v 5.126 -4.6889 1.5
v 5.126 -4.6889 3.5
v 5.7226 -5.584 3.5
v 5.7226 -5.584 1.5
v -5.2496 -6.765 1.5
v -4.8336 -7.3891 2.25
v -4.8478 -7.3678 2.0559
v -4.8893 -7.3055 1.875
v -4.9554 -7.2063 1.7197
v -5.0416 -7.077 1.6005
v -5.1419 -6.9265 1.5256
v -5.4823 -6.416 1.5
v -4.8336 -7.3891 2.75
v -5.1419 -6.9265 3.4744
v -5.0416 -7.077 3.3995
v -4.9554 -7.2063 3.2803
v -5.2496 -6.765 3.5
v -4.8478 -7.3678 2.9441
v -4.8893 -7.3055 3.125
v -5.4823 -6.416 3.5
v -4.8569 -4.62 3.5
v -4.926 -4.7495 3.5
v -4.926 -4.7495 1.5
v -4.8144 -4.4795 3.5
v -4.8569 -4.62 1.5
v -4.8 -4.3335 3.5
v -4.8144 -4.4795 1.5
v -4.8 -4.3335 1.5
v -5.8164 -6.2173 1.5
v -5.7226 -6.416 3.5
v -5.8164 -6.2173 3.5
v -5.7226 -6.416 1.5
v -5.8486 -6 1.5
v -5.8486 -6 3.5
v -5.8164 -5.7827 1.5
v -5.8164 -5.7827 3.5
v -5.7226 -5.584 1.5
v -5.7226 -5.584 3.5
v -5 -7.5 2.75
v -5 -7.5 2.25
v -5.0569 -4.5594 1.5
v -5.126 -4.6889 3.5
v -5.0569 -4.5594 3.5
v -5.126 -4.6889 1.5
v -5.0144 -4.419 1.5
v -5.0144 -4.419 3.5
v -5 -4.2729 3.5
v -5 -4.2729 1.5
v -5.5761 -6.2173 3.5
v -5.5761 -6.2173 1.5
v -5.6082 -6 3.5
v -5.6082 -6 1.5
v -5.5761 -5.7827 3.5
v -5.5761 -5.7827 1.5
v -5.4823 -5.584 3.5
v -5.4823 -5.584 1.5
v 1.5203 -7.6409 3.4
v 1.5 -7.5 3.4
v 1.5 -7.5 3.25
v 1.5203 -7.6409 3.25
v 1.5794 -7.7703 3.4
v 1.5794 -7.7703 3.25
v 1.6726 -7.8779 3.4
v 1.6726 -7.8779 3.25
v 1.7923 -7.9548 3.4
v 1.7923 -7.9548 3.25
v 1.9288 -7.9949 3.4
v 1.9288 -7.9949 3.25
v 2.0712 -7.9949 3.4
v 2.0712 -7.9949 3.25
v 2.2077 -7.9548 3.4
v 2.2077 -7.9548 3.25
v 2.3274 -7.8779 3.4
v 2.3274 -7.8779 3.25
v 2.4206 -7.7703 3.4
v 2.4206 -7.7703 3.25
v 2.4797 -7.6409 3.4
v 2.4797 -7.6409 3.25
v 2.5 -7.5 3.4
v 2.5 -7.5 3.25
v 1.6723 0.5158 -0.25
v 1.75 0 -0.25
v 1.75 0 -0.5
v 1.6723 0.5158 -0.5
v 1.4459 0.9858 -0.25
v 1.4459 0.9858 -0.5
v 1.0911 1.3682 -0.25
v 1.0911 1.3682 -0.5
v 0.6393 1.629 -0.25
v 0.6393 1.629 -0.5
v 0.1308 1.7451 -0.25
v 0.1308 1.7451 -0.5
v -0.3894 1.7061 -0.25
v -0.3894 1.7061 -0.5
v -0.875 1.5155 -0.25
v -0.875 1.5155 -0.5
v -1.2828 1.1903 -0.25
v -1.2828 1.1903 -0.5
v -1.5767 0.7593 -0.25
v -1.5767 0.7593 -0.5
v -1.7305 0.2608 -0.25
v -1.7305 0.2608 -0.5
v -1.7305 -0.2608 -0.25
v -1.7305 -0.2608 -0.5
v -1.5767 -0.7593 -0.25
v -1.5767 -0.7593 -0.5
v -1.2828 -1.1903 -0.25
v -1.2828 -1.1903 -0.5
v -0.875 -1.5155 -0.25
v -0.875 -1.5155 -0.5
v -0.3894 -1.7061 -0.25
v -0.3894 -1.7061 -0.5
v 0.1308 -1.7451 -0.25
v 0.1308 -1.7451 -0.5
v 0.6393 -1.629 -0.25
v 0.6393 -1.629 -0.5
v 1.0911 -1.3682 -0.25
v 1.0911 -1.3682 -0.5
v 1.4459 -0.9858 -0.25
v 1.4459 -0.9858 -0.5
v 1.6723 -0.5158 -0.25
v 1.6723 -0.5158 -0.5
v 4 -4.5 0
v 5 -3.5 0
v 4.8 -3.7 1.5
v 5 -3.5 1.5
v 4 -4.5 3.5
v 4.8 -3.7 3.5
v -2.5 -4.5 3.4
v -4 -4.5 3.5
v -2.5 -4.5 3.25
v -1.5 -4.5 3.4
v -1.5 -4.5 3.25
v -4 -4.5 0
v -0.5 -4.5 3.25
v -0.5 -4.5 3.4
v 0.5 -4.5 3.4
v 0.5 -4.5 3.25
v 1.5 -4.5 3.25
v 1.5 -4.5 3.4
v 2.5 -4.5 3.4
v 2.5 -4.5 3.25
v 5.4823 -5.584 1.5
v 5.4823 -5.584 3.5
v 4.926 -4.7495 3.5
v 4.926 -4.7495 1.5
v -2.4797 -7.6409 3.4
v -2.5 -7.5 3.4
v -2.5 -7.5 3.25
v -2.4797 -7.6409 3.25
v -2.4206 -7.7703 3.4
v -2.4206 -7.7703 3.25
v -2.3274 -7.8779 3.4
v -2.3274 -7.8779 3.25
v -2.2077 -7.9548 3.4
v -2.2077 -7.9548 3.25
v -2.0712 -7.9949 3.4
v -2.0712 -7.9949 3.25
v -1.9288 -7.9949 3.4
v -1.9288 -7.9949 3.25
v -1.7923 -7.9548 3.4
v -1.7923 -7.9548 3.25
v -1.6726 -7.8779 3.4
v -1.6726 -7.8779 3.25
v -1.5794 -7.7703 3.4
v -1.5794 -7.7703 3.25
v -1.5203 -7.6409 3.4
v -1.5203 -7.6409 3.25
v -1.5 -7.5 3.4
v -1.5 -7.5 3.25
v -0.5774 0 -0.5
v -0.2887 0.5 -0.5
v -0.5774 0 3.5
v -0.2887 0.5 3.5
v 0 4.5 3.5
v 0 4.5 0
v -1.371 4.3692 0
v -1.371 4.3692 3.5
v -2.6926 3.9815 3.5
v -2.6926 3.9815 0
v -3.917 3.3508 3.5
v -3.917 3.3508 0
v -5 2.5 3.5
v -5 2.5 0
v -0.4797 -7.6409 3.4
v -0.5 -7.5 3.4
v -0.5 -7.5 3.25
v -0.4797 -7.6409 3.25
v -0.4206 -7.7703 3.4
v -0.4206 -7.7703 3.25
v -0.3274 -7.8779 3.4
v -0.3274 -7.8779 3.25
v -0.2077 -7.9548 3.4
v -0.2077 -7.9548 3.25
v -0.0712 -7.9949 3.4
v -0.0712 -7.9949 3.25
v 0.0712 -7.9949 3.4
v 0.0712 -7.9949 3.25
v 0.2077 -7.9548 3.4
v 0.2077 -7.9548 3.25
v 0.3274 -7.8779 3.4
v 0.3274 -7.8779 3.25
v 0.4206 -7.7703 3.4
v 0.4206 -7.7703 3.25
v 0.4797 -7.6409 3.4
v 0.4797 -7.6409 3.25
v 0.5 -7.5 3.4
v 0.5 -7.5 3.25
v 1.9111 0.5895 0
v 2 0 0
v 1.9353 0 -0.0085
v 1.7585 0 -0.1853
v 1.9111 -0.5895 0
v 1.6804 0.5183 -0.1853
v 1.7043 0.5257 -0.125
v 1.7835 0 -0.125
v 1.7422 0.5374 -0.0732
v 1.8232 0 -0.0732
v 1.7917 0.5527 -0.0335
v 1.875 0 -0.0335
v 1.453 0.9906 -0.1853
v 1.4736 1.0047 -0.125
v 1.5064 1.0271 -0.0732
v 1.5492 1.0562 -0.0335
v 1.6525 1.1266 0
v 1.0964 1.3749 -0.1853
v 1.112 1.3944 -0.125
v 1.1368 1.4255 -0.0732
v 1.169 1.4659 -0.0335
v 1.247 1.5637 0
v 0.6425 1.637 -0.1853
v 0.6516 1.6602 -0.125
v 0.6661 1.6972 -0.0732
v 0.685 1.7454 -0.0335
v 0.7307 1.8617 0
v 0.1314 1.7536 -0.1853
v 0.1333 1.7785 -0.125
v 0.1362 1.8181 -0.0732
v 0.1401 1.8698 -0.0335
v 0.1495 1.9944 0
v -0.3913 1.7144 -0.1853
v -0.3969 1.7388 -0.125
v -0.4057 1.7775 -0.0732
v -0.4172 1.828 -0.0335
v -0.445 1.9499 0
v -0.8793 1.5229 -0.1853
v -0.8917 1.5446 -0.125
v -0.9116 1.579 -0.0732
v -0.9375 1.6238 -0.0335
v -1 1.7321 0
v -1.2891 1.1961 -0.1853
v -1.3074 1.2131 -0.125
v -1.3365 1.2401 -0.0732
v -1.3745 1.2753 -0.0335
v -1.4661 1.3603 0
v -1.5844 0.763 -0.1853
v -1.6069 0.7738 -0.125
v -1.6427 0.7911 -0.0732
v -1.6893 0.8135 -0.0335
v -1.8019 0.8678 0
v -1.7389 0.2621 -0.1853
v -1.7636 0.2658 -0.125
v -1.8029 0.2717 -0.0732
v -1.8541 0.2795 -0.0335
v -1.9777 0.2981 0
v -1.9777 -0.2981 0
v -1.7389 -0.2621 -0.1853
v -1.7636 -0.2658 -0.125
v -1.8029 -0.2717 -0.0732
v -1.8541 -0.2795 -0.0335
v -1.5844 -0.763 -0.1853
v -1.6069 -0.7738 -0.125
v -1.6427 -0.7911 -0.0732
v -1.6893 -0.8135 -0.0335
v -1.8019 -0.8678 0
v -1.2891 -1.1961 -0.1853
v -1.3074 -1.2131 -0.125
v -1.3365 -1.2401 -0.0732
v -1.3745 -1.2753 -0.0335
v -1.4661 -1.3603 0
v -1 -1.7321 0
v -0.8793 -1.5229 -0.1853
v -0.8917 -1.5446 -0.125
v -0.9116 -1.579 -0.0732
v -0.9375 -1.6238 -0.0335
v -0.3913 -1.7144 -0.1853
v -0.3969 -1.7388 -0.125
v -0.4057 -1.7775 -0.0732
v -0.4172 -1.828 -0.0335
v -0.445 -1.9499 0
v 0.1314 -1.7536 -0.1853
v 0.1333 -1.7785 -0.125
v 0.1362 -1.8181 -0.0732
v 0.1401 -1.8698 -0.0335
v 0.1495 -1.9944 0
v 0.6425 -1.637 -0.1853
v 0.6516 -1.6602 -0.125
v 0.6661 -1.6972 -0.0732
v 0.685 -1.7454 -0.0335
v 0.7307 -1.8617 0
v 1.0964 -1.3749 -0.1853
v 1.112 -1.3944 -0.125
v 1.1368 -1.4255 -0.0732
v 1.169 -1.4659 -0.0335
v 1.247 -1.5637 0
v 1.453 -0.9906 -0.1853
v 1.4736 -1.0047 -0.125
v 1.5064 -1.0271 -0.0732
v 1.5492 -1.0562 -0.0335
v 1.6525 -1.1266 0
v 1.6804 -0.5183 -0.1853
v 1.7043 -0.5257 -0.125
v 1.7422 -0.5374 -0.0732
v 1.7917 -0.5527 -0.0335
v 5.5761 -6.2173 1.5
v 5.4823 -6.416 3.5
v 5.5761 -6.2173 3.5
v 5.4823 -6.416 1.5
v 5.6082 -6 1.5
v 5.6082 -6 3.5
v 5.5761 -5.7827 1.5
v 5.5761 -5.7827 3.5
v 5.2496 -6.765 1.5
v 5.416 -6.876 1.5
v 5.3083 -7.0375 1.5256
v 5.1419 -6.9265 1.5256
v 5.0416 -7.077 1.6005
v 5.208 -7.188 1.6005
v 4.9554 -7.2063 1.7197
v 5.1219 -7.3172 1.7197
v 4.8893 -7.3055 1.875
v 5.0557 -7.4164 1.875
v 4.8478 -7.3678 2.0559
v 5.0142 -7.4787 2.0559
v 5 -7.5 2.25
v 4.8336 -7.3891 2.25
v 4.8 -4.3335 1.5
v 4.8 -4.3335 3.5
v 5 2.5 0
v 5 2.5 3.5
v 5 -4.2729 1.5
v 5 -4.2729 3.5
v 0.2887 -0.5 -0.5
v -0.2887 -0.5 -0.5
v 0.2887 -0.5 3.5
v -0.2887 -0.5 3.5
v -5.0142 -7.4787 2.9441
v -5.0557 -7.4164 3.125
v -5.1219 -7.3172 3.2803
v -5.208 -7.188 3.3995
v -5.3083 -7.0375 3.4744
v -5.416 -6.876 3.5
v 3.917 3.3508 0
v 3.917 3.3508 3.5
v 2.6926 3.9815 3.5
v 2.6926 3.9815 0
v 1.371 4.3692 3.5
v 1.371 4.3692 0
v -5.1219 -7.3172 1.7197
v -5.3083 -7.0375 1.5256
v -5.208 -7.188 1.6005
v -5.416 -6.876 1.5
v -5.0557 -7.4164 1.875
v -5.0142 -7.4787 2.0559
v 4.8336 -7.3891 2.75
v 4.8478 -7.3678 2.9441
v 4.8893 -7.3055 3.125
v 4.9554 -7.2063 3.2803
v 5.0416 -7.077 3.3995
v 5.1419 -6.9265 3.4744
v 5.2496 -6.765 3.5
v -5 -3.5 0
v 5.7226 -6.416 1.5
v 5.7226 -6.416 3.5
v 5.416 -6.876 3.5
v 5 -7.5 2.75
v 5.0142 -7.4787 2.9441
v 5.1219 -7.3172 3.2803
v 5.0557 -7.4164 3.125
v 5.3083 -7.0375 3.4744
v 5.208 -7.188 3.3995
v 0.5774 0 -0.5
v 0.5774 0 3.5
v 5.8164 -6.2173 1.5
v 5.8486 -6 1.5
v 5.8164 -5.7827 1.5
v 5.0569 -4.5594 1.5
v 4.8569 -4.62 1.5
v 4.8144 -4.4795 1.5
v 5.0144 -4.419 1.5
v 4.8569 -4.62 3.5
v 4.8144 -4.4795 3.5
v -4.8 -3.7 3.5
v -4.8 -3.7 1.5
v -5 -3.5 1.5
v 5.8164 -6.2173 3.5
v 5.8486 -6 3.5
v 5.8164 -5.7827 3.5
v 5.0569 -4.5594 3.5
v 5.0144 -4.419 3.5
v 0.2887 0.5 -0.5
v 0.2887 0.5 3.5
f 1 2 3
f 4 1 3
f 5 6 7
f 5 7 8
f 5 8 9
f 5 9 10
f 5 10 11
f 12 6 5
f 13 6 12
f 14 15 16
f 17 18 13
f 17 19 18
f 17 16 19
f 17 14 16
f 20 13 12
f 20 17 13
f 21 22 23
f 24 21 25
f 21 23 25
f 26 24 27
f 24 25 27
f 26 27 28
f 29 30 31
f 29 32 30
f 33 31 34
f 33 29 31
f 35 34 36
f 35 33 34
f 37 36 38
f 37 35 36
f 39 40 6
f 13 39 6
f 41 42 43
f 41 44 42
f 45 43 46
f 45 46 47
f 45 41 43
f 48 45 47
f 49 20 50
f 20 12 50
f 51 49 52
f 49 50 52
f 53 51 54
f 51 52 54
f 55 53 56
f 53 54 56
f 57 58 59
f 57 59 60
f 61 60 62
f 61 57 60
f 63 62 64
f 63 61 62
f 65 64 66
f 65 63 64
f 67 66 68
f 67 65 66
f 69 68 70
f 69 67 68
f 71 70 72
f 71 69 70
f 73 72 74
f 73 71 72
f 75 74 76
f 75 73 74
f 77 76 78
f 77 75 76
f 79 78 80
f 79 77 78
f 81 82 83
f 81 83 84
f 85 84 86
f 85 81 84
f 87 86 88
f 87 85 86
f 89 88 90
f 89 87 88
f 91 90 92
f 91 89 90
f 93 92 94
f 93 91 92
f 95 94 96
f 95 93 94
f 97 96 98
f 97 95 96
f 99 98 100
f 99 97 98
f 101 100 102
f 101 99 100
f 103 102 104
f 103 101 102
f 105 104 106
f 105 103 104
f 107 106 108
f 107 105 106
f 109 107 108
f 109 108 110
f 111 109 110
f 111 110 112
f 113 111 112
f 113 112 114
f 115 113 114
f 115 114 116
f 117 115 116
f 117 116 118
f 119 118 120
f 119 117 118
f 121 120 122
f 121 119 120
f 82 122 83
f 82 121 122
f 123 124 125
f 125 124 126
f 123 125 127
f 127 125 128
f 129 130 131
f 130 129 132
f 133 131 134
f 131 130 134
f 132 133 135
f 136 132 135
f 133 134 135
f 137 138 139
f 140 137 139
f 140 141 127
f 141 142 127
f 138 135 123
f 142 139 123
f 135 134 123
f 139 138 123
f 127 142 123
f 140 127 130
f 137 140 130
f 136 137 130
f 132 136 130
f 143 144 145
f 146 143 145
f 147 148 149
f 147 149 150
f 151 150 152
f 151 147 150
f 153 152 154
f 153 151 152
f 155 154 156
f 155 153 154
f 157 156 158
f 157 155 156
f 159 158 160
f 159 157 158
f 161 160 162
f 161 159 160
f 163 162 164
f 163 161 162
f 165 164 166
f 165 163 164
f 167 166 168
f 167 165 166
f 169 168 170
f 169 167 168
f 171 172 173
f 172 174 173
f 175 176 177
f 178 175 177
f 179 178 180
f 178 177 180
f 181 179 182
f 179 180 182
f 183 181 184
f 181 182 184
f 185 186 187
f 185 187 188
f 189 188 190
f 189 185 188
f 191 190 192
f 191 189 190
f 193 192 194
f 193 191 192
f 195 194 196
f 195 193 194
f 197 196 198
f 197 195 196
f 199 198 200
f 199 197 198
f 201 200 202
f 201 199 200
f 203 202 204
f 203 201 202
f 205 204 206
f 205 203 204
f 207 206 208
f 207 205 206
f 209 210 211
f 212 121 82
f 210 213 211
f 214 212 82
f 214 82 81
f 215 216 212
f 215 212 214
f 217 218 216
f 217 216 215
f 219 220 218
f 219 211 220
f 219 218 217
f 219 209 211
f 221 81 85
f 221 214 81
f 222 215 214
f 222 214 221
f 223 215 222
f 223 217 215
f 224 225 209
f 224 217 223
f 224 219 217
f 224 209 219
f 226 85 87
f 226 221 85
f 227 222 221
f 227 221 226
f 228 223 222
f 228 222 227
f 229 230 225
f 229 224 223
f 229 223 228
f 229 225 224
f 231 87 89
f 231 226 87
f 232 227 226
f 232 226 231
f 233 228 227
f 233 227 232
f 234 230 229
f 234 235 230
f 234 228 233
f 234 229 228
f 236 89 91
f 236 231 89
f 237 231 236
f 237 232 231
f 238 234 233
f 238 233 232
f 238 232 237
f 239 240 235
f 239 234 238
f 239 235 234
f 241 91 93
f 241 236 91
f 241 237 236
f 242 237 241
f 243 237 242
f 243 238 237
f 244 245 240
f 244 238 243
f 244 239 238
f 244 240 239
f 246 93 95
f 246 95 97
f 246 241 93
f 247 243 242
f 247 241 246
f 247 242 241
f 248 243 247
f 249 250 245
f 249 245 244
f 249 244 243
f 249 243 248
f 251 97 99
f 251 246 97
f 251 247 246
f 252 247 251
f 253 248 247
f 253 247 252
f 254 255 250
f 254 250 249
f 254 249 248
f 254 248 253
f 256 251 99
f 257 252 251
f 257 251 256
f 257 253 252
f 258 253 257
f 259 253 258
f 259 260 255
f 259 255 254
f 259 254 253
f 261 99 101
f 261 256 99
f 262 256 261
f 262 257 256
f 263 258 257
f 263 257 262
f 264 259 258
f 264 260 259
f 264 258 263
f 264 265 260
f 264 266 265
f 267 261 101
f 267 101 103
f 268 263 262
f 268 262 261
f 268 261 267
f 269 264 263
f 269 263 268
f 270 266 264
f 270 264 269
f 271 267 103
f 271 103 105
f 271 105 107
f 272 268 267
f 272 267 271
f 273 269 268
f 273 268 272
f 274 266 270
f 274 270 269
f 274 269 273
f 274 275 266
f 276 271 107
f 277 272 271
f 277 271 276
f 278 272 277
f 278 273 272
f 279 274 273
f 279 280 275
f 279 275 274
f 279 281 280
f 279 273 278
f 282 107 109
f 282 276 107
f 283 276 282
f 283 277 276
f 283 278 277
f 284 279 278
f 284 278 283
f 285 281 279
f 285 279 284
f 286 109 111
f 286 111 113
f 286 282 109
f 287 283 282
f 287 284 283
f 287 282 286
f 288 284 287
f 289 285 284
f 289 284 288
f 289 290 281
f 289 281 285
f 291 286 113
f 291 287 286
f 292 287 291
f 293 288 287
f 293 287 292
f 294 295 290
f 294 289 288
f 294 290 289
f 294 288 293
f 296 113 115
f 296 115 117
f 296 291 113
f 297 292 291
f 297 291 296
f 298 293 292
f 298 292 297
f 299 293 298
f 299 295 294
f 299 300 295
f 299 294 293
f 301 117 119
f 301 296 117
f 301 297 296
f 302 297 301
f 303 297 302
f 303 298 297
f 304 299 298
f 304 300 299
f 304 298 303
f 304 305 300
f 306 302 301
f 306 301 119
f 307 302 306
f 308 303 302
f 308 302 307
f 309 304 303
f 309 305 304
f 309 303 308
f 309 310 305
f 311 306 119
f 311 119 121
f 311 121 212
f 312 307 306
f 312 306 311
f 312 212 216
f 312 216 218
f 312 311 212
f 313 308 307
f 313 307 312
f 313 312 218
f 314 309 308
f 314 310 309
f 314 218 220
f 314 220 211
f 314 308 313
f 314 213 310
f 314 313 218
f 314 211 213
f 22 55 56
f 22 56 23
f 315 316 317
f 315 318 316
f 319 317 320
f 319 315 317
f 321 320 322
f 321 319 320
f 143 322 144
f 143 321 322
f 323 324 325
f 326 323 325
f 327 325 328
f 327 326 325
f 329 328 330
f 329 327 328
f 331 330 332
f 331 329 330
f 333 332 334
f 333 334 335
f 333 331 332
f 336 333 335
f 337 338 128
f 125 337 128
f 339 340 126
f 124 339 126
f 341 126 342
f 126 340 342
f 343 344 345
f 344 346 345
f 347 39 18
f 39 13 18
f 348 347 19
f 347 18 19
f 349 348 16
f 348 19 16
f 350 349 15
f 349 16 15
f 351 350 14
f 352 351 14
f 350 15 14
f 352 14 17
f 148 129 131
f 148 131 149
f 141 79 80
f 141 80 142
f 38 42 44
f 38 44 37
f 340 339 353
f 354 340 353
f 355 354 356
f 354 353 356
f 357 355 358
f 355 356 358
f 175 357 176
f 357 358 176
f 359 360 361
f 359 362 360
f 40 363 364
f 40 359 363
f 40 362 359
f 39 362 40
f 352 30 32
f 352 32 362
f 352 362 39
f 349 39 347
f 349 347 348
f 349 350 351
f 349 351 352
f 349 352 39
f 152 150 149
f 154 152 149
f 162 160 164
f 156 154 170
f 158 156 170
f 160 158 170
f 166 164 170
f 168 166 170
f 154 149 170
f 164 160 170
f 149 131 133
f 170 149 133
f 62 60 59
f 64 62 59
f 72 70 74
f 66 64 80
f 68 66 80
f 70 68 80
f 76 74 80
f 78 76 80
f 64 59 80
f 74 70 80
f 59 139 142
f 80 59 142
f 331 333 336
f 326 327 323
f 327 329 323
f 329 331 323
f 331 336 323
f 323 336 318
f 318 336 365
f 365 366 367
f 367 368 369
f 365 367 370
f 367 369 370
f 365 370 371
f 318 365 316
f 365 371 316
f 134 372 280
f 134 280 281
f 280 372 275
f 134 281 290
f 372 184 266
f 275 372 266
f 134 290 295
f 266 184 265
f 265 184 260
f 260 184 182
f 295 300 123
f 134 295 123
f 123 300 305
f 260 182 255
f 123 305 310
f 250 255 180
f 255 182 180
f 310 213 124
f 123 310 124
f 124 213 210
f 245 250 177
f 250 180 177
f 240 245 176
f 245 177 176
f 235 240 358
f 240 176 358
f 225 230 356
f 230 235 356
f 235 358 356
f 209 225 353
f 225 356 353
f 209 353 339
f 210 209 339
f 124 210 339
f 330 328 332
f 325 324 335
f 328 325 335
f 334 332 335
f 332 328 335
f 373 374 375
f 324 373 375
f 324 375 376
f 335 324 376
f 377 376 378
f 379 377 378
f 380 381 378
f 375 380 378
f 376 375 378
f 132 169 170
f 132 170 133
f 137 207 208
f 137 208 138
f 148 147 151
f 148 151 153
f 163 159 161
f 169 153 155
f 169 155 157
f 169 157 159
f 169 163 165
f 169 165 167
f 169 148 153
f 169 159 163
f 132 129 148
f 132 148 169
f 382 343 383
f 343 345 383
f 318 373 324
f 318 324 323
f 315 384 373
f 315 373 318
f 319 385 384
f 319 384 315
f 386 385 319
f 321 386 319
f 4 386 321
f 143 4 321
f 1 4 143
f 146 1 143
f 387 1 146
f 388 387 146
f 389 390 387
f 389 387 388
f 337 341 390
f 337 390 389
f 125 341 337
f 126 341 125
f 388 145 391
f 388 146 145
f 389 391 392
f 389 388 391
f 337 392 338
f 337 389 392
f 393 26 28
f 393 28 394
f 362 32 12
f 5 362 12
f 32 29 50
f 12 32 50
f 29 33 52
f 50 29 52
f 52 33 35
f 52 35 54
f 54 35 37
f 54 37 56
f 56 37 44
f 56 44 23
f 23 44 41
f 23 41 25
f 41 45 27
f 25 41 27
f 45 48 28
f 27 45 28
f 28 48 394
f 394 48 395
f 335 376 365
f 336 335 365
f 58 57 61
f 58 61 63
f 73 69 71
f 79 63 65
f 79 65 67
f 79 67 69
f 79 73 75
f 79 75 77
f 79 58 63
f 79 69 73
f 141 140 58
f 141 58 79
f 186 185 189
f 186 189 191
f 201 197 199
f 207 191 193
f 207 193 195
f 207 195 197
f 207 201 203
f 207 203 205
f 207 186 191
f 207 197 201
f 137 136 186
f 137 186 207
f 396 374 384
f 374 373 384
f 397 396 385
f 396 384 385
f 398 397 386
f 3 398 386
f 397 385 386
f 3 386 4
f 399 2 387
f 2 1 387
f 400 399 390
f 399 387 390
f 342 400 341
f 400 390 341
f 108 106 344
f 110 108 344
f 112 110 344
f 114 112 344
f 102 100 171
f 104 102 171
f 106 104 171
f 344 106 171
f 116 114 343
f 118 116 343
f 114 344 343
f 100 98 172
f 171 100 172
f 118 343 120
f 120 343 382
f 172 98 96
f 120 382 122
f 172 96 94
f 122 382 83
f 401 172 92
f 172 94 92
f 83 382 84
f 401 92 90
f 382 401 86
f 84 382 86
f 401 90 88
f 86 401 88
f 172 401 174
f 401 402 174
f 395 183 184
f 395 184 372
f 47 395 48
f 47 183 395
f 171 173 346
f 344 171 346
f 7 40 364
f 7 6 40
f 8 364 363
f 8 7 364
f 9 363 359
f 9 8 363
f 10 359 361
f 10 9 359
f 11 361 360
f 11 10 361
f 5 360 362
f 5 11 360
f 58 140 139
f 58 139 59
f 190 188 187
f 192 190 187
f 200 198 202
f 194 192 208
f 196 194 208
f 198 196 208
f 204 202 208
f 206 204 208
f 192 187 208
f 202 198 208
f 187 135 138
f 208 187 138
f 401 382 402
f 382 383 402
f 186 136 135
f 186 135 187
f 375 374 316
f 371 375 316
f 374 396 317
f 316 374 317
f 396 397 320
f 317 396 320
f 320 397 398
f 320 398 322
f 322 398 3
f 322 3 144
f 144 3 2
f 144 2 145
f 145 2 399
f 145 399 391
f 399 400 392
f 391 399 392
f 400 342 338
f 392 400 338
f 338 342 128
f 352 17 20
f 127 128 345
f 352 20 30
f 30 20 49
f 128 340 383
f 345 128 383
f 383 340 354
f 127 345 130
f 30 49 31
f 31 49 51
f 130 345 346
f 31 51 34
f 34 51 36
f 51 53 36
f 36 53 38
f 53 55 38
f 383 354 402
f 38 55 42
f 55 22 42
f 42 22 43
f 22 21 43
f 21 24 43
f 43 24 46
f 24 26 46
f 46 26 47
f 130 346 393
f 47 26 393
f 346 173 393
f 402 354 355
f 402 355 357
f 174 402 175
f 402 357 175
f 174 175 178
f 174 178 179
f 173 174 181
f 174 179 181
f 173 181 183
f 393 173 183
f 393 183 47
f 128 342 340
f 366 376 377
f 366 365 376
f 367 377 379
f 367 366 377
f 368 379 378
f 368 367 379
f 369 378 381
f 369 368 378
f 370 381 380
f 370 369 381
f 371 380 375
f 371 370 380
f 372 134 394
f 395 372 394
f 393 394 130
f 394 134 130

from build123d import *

# Parameters (mm, degrees)
BOSS_EXTRU_1_DEPTH             = 3.5
ESQUISSE2_R                    = 1.75
BOSS_EXTRU_2_DEPTH             = 0.5
CONG_1_R                       = 0.25
BOSS_EXTRU_3_START             = -0.1
BOSS_EXTRU_3_DEPTH             = 0.15
R_P_TITION_LIN_AIRE1_COUNT     = 2
R_P_TITION_LIN_AIRE1_PITCH     = 2
R_P_TITION_LIN_AIRE1_COL_COUNT = 2
R_P_TITION_LIN_AIRE1_COL_PITCH = 2
CHANFREIN1_SIZE                = 1
EXTRU_MINCE1_DEPTH             = 2
CONG_2_R                       = 0.75
CONG_3_R                       = 0.75


with BuildPart() as part:
    # Esquisse1 → Boss.-Extru.1 (new body)
    with BuildSketch(Plane.XY):
        with BuildLine():
            Line((-5, 2.5), (-5, -4.5))
            Line((-5, -4.5), (5, -4.5))
            Line((5, -4.5), (5, 2.5))
            ThreePointArc((5, 2.5), (2.692582404, 3.981456009), (0, 4.5))
            ThreePointArc((0, 4.5), (-2.692582404, 3.981456009), (-5, 2.5))
        make_face()
        Polygon((-0.288675135, 0.5), (-0.577350269, 0), (-0.288675135, -0.5), (0.288675135, -0.5), (0.577350269, 0), (0.288675135, 0.5), align=None, mode=Mode.SUBTRACT)
    extrude(amount=BOSS_EXTRU_1_DEPTH)

    # Esquisse2 → Boss.-Extru.2 (add)
    with BuildSketch(Plane.XY):
        Circle(ESQUISSE2_R)
        Polygon((-0.577350269, 0), (-0.288675135, -0.5), (0.288675135, -0.5), (0.577350269, 0), (0.288675135, 0.5), (-0.288675135, 0.5), align=None, mode=Mode.SUBTRACT)
    extrude(amount=-BOSS_EXTRU_2_DEPTH)

    # Congé1
    cong_1_edges = [part.edges().sort_by_distance(p)[0] for p in [
        (-1.75, 0, 0),
    ]]
    fillet(cong_1_edges, radius=CONG_1_R)

    # Esquisse3 → Boss.-Extru.3 (add)
    with BuildSketch(Plane.XY.offset(3.5).offset(BOSS_EXTRU_3_START)):
        with BuildLine():
            Line((-0.5, -4.5), (-0.5, -7.5))
            ThreePointArc((-0.5, -7.5), (0, -8), (0.5, -7.5))
            Line((0.5, -7.5), (0.5, -4.5))
            Line((0.5, -4.5), (-0.5, -4.5))
        make_face()
    boss_extru_3 = extrude(amount=-BOSS_EXTRU_3_DEPTH)

    # Répétition linéaire1: Boss.-Extru.3 ×2
    with Locations(*[(i * R_P_TITION_LIN_AIRE1_PITCH, 0, 0) for i in range(1, R_P_TITION_LIN_AIRE1_COUNT)]):
        add(boss_extru_3)

    # Répétition linéaire1 col: Boss.-Extru.3 ×2
    with Locations(*[(-i * R_P_TITION_LIN_AIRE1_COL_PITCH, 0, 0) for i in range(1, R_P_TITION_LIN_AIRE1_COL_COUNT)]):
        add(boss_extru_3)

    # Chanfrein1
    chanfrein1_edges = [part.edges().sort_by_distance(p)[0] for p in [
        (5, -4.5, 1.75),
        (-5, -4.5, 1.75),
    ]]
    chamfer(chanfrein1_edges, length=CHANFREIN1_SIZE)

    # Esquisse4 → Extru.-Mince1 (add)
    with BuildSketch(Plane.XY.offset(3.5)):
        Polygon((-5, -3.5), (-5, -4.5), (-6, -6), (-5, -7.5), (-4.833589941, -7.389059961), (-5.759629915, -6), (-4.8, -4.560555128), (-4.8, -3.5), align=None)
    extru_mince1 = extrude(amount=-EXTRU_MINCE1_DEPTH)

    # Symétrie1: Extru.-Mince1 across plane
    add(extru_mince1.mirror(Plane.ZY))

    # Congé2
    cong_2_edges = [part.edges().sort_by_distance(p)[0] for p in [
        (-4.916794971, -7.44452998, 3.5),
        (-4.916794971, -7.44452998, 1.5),
        (4.916794971, -7.44452998, 1.5),
        (4.916794971, -7.44452998, 3.5),
    ]]
    fillet(cong_2_edges, radius=CONG_2_R)

    # Congé3
    cong_3_edges = [part.edges().sort_by_distance(p)[0] for p in [
        (-6, -6, 2.5),
        (-5, -4.5, 2.5),
        (-4.8, -4.560555128, 2.5),
        (-5.759629915, -6, 2.5),
        (6, -6, 2.5),
        (5.759629915, -6, 2.5),
        (4.8, -4.560555128, 2.5),
        (5, -4.5, 2.5),
    ]]
    fillet(cong_3_edges, radius=CONG_3_R)


solid = part.part
